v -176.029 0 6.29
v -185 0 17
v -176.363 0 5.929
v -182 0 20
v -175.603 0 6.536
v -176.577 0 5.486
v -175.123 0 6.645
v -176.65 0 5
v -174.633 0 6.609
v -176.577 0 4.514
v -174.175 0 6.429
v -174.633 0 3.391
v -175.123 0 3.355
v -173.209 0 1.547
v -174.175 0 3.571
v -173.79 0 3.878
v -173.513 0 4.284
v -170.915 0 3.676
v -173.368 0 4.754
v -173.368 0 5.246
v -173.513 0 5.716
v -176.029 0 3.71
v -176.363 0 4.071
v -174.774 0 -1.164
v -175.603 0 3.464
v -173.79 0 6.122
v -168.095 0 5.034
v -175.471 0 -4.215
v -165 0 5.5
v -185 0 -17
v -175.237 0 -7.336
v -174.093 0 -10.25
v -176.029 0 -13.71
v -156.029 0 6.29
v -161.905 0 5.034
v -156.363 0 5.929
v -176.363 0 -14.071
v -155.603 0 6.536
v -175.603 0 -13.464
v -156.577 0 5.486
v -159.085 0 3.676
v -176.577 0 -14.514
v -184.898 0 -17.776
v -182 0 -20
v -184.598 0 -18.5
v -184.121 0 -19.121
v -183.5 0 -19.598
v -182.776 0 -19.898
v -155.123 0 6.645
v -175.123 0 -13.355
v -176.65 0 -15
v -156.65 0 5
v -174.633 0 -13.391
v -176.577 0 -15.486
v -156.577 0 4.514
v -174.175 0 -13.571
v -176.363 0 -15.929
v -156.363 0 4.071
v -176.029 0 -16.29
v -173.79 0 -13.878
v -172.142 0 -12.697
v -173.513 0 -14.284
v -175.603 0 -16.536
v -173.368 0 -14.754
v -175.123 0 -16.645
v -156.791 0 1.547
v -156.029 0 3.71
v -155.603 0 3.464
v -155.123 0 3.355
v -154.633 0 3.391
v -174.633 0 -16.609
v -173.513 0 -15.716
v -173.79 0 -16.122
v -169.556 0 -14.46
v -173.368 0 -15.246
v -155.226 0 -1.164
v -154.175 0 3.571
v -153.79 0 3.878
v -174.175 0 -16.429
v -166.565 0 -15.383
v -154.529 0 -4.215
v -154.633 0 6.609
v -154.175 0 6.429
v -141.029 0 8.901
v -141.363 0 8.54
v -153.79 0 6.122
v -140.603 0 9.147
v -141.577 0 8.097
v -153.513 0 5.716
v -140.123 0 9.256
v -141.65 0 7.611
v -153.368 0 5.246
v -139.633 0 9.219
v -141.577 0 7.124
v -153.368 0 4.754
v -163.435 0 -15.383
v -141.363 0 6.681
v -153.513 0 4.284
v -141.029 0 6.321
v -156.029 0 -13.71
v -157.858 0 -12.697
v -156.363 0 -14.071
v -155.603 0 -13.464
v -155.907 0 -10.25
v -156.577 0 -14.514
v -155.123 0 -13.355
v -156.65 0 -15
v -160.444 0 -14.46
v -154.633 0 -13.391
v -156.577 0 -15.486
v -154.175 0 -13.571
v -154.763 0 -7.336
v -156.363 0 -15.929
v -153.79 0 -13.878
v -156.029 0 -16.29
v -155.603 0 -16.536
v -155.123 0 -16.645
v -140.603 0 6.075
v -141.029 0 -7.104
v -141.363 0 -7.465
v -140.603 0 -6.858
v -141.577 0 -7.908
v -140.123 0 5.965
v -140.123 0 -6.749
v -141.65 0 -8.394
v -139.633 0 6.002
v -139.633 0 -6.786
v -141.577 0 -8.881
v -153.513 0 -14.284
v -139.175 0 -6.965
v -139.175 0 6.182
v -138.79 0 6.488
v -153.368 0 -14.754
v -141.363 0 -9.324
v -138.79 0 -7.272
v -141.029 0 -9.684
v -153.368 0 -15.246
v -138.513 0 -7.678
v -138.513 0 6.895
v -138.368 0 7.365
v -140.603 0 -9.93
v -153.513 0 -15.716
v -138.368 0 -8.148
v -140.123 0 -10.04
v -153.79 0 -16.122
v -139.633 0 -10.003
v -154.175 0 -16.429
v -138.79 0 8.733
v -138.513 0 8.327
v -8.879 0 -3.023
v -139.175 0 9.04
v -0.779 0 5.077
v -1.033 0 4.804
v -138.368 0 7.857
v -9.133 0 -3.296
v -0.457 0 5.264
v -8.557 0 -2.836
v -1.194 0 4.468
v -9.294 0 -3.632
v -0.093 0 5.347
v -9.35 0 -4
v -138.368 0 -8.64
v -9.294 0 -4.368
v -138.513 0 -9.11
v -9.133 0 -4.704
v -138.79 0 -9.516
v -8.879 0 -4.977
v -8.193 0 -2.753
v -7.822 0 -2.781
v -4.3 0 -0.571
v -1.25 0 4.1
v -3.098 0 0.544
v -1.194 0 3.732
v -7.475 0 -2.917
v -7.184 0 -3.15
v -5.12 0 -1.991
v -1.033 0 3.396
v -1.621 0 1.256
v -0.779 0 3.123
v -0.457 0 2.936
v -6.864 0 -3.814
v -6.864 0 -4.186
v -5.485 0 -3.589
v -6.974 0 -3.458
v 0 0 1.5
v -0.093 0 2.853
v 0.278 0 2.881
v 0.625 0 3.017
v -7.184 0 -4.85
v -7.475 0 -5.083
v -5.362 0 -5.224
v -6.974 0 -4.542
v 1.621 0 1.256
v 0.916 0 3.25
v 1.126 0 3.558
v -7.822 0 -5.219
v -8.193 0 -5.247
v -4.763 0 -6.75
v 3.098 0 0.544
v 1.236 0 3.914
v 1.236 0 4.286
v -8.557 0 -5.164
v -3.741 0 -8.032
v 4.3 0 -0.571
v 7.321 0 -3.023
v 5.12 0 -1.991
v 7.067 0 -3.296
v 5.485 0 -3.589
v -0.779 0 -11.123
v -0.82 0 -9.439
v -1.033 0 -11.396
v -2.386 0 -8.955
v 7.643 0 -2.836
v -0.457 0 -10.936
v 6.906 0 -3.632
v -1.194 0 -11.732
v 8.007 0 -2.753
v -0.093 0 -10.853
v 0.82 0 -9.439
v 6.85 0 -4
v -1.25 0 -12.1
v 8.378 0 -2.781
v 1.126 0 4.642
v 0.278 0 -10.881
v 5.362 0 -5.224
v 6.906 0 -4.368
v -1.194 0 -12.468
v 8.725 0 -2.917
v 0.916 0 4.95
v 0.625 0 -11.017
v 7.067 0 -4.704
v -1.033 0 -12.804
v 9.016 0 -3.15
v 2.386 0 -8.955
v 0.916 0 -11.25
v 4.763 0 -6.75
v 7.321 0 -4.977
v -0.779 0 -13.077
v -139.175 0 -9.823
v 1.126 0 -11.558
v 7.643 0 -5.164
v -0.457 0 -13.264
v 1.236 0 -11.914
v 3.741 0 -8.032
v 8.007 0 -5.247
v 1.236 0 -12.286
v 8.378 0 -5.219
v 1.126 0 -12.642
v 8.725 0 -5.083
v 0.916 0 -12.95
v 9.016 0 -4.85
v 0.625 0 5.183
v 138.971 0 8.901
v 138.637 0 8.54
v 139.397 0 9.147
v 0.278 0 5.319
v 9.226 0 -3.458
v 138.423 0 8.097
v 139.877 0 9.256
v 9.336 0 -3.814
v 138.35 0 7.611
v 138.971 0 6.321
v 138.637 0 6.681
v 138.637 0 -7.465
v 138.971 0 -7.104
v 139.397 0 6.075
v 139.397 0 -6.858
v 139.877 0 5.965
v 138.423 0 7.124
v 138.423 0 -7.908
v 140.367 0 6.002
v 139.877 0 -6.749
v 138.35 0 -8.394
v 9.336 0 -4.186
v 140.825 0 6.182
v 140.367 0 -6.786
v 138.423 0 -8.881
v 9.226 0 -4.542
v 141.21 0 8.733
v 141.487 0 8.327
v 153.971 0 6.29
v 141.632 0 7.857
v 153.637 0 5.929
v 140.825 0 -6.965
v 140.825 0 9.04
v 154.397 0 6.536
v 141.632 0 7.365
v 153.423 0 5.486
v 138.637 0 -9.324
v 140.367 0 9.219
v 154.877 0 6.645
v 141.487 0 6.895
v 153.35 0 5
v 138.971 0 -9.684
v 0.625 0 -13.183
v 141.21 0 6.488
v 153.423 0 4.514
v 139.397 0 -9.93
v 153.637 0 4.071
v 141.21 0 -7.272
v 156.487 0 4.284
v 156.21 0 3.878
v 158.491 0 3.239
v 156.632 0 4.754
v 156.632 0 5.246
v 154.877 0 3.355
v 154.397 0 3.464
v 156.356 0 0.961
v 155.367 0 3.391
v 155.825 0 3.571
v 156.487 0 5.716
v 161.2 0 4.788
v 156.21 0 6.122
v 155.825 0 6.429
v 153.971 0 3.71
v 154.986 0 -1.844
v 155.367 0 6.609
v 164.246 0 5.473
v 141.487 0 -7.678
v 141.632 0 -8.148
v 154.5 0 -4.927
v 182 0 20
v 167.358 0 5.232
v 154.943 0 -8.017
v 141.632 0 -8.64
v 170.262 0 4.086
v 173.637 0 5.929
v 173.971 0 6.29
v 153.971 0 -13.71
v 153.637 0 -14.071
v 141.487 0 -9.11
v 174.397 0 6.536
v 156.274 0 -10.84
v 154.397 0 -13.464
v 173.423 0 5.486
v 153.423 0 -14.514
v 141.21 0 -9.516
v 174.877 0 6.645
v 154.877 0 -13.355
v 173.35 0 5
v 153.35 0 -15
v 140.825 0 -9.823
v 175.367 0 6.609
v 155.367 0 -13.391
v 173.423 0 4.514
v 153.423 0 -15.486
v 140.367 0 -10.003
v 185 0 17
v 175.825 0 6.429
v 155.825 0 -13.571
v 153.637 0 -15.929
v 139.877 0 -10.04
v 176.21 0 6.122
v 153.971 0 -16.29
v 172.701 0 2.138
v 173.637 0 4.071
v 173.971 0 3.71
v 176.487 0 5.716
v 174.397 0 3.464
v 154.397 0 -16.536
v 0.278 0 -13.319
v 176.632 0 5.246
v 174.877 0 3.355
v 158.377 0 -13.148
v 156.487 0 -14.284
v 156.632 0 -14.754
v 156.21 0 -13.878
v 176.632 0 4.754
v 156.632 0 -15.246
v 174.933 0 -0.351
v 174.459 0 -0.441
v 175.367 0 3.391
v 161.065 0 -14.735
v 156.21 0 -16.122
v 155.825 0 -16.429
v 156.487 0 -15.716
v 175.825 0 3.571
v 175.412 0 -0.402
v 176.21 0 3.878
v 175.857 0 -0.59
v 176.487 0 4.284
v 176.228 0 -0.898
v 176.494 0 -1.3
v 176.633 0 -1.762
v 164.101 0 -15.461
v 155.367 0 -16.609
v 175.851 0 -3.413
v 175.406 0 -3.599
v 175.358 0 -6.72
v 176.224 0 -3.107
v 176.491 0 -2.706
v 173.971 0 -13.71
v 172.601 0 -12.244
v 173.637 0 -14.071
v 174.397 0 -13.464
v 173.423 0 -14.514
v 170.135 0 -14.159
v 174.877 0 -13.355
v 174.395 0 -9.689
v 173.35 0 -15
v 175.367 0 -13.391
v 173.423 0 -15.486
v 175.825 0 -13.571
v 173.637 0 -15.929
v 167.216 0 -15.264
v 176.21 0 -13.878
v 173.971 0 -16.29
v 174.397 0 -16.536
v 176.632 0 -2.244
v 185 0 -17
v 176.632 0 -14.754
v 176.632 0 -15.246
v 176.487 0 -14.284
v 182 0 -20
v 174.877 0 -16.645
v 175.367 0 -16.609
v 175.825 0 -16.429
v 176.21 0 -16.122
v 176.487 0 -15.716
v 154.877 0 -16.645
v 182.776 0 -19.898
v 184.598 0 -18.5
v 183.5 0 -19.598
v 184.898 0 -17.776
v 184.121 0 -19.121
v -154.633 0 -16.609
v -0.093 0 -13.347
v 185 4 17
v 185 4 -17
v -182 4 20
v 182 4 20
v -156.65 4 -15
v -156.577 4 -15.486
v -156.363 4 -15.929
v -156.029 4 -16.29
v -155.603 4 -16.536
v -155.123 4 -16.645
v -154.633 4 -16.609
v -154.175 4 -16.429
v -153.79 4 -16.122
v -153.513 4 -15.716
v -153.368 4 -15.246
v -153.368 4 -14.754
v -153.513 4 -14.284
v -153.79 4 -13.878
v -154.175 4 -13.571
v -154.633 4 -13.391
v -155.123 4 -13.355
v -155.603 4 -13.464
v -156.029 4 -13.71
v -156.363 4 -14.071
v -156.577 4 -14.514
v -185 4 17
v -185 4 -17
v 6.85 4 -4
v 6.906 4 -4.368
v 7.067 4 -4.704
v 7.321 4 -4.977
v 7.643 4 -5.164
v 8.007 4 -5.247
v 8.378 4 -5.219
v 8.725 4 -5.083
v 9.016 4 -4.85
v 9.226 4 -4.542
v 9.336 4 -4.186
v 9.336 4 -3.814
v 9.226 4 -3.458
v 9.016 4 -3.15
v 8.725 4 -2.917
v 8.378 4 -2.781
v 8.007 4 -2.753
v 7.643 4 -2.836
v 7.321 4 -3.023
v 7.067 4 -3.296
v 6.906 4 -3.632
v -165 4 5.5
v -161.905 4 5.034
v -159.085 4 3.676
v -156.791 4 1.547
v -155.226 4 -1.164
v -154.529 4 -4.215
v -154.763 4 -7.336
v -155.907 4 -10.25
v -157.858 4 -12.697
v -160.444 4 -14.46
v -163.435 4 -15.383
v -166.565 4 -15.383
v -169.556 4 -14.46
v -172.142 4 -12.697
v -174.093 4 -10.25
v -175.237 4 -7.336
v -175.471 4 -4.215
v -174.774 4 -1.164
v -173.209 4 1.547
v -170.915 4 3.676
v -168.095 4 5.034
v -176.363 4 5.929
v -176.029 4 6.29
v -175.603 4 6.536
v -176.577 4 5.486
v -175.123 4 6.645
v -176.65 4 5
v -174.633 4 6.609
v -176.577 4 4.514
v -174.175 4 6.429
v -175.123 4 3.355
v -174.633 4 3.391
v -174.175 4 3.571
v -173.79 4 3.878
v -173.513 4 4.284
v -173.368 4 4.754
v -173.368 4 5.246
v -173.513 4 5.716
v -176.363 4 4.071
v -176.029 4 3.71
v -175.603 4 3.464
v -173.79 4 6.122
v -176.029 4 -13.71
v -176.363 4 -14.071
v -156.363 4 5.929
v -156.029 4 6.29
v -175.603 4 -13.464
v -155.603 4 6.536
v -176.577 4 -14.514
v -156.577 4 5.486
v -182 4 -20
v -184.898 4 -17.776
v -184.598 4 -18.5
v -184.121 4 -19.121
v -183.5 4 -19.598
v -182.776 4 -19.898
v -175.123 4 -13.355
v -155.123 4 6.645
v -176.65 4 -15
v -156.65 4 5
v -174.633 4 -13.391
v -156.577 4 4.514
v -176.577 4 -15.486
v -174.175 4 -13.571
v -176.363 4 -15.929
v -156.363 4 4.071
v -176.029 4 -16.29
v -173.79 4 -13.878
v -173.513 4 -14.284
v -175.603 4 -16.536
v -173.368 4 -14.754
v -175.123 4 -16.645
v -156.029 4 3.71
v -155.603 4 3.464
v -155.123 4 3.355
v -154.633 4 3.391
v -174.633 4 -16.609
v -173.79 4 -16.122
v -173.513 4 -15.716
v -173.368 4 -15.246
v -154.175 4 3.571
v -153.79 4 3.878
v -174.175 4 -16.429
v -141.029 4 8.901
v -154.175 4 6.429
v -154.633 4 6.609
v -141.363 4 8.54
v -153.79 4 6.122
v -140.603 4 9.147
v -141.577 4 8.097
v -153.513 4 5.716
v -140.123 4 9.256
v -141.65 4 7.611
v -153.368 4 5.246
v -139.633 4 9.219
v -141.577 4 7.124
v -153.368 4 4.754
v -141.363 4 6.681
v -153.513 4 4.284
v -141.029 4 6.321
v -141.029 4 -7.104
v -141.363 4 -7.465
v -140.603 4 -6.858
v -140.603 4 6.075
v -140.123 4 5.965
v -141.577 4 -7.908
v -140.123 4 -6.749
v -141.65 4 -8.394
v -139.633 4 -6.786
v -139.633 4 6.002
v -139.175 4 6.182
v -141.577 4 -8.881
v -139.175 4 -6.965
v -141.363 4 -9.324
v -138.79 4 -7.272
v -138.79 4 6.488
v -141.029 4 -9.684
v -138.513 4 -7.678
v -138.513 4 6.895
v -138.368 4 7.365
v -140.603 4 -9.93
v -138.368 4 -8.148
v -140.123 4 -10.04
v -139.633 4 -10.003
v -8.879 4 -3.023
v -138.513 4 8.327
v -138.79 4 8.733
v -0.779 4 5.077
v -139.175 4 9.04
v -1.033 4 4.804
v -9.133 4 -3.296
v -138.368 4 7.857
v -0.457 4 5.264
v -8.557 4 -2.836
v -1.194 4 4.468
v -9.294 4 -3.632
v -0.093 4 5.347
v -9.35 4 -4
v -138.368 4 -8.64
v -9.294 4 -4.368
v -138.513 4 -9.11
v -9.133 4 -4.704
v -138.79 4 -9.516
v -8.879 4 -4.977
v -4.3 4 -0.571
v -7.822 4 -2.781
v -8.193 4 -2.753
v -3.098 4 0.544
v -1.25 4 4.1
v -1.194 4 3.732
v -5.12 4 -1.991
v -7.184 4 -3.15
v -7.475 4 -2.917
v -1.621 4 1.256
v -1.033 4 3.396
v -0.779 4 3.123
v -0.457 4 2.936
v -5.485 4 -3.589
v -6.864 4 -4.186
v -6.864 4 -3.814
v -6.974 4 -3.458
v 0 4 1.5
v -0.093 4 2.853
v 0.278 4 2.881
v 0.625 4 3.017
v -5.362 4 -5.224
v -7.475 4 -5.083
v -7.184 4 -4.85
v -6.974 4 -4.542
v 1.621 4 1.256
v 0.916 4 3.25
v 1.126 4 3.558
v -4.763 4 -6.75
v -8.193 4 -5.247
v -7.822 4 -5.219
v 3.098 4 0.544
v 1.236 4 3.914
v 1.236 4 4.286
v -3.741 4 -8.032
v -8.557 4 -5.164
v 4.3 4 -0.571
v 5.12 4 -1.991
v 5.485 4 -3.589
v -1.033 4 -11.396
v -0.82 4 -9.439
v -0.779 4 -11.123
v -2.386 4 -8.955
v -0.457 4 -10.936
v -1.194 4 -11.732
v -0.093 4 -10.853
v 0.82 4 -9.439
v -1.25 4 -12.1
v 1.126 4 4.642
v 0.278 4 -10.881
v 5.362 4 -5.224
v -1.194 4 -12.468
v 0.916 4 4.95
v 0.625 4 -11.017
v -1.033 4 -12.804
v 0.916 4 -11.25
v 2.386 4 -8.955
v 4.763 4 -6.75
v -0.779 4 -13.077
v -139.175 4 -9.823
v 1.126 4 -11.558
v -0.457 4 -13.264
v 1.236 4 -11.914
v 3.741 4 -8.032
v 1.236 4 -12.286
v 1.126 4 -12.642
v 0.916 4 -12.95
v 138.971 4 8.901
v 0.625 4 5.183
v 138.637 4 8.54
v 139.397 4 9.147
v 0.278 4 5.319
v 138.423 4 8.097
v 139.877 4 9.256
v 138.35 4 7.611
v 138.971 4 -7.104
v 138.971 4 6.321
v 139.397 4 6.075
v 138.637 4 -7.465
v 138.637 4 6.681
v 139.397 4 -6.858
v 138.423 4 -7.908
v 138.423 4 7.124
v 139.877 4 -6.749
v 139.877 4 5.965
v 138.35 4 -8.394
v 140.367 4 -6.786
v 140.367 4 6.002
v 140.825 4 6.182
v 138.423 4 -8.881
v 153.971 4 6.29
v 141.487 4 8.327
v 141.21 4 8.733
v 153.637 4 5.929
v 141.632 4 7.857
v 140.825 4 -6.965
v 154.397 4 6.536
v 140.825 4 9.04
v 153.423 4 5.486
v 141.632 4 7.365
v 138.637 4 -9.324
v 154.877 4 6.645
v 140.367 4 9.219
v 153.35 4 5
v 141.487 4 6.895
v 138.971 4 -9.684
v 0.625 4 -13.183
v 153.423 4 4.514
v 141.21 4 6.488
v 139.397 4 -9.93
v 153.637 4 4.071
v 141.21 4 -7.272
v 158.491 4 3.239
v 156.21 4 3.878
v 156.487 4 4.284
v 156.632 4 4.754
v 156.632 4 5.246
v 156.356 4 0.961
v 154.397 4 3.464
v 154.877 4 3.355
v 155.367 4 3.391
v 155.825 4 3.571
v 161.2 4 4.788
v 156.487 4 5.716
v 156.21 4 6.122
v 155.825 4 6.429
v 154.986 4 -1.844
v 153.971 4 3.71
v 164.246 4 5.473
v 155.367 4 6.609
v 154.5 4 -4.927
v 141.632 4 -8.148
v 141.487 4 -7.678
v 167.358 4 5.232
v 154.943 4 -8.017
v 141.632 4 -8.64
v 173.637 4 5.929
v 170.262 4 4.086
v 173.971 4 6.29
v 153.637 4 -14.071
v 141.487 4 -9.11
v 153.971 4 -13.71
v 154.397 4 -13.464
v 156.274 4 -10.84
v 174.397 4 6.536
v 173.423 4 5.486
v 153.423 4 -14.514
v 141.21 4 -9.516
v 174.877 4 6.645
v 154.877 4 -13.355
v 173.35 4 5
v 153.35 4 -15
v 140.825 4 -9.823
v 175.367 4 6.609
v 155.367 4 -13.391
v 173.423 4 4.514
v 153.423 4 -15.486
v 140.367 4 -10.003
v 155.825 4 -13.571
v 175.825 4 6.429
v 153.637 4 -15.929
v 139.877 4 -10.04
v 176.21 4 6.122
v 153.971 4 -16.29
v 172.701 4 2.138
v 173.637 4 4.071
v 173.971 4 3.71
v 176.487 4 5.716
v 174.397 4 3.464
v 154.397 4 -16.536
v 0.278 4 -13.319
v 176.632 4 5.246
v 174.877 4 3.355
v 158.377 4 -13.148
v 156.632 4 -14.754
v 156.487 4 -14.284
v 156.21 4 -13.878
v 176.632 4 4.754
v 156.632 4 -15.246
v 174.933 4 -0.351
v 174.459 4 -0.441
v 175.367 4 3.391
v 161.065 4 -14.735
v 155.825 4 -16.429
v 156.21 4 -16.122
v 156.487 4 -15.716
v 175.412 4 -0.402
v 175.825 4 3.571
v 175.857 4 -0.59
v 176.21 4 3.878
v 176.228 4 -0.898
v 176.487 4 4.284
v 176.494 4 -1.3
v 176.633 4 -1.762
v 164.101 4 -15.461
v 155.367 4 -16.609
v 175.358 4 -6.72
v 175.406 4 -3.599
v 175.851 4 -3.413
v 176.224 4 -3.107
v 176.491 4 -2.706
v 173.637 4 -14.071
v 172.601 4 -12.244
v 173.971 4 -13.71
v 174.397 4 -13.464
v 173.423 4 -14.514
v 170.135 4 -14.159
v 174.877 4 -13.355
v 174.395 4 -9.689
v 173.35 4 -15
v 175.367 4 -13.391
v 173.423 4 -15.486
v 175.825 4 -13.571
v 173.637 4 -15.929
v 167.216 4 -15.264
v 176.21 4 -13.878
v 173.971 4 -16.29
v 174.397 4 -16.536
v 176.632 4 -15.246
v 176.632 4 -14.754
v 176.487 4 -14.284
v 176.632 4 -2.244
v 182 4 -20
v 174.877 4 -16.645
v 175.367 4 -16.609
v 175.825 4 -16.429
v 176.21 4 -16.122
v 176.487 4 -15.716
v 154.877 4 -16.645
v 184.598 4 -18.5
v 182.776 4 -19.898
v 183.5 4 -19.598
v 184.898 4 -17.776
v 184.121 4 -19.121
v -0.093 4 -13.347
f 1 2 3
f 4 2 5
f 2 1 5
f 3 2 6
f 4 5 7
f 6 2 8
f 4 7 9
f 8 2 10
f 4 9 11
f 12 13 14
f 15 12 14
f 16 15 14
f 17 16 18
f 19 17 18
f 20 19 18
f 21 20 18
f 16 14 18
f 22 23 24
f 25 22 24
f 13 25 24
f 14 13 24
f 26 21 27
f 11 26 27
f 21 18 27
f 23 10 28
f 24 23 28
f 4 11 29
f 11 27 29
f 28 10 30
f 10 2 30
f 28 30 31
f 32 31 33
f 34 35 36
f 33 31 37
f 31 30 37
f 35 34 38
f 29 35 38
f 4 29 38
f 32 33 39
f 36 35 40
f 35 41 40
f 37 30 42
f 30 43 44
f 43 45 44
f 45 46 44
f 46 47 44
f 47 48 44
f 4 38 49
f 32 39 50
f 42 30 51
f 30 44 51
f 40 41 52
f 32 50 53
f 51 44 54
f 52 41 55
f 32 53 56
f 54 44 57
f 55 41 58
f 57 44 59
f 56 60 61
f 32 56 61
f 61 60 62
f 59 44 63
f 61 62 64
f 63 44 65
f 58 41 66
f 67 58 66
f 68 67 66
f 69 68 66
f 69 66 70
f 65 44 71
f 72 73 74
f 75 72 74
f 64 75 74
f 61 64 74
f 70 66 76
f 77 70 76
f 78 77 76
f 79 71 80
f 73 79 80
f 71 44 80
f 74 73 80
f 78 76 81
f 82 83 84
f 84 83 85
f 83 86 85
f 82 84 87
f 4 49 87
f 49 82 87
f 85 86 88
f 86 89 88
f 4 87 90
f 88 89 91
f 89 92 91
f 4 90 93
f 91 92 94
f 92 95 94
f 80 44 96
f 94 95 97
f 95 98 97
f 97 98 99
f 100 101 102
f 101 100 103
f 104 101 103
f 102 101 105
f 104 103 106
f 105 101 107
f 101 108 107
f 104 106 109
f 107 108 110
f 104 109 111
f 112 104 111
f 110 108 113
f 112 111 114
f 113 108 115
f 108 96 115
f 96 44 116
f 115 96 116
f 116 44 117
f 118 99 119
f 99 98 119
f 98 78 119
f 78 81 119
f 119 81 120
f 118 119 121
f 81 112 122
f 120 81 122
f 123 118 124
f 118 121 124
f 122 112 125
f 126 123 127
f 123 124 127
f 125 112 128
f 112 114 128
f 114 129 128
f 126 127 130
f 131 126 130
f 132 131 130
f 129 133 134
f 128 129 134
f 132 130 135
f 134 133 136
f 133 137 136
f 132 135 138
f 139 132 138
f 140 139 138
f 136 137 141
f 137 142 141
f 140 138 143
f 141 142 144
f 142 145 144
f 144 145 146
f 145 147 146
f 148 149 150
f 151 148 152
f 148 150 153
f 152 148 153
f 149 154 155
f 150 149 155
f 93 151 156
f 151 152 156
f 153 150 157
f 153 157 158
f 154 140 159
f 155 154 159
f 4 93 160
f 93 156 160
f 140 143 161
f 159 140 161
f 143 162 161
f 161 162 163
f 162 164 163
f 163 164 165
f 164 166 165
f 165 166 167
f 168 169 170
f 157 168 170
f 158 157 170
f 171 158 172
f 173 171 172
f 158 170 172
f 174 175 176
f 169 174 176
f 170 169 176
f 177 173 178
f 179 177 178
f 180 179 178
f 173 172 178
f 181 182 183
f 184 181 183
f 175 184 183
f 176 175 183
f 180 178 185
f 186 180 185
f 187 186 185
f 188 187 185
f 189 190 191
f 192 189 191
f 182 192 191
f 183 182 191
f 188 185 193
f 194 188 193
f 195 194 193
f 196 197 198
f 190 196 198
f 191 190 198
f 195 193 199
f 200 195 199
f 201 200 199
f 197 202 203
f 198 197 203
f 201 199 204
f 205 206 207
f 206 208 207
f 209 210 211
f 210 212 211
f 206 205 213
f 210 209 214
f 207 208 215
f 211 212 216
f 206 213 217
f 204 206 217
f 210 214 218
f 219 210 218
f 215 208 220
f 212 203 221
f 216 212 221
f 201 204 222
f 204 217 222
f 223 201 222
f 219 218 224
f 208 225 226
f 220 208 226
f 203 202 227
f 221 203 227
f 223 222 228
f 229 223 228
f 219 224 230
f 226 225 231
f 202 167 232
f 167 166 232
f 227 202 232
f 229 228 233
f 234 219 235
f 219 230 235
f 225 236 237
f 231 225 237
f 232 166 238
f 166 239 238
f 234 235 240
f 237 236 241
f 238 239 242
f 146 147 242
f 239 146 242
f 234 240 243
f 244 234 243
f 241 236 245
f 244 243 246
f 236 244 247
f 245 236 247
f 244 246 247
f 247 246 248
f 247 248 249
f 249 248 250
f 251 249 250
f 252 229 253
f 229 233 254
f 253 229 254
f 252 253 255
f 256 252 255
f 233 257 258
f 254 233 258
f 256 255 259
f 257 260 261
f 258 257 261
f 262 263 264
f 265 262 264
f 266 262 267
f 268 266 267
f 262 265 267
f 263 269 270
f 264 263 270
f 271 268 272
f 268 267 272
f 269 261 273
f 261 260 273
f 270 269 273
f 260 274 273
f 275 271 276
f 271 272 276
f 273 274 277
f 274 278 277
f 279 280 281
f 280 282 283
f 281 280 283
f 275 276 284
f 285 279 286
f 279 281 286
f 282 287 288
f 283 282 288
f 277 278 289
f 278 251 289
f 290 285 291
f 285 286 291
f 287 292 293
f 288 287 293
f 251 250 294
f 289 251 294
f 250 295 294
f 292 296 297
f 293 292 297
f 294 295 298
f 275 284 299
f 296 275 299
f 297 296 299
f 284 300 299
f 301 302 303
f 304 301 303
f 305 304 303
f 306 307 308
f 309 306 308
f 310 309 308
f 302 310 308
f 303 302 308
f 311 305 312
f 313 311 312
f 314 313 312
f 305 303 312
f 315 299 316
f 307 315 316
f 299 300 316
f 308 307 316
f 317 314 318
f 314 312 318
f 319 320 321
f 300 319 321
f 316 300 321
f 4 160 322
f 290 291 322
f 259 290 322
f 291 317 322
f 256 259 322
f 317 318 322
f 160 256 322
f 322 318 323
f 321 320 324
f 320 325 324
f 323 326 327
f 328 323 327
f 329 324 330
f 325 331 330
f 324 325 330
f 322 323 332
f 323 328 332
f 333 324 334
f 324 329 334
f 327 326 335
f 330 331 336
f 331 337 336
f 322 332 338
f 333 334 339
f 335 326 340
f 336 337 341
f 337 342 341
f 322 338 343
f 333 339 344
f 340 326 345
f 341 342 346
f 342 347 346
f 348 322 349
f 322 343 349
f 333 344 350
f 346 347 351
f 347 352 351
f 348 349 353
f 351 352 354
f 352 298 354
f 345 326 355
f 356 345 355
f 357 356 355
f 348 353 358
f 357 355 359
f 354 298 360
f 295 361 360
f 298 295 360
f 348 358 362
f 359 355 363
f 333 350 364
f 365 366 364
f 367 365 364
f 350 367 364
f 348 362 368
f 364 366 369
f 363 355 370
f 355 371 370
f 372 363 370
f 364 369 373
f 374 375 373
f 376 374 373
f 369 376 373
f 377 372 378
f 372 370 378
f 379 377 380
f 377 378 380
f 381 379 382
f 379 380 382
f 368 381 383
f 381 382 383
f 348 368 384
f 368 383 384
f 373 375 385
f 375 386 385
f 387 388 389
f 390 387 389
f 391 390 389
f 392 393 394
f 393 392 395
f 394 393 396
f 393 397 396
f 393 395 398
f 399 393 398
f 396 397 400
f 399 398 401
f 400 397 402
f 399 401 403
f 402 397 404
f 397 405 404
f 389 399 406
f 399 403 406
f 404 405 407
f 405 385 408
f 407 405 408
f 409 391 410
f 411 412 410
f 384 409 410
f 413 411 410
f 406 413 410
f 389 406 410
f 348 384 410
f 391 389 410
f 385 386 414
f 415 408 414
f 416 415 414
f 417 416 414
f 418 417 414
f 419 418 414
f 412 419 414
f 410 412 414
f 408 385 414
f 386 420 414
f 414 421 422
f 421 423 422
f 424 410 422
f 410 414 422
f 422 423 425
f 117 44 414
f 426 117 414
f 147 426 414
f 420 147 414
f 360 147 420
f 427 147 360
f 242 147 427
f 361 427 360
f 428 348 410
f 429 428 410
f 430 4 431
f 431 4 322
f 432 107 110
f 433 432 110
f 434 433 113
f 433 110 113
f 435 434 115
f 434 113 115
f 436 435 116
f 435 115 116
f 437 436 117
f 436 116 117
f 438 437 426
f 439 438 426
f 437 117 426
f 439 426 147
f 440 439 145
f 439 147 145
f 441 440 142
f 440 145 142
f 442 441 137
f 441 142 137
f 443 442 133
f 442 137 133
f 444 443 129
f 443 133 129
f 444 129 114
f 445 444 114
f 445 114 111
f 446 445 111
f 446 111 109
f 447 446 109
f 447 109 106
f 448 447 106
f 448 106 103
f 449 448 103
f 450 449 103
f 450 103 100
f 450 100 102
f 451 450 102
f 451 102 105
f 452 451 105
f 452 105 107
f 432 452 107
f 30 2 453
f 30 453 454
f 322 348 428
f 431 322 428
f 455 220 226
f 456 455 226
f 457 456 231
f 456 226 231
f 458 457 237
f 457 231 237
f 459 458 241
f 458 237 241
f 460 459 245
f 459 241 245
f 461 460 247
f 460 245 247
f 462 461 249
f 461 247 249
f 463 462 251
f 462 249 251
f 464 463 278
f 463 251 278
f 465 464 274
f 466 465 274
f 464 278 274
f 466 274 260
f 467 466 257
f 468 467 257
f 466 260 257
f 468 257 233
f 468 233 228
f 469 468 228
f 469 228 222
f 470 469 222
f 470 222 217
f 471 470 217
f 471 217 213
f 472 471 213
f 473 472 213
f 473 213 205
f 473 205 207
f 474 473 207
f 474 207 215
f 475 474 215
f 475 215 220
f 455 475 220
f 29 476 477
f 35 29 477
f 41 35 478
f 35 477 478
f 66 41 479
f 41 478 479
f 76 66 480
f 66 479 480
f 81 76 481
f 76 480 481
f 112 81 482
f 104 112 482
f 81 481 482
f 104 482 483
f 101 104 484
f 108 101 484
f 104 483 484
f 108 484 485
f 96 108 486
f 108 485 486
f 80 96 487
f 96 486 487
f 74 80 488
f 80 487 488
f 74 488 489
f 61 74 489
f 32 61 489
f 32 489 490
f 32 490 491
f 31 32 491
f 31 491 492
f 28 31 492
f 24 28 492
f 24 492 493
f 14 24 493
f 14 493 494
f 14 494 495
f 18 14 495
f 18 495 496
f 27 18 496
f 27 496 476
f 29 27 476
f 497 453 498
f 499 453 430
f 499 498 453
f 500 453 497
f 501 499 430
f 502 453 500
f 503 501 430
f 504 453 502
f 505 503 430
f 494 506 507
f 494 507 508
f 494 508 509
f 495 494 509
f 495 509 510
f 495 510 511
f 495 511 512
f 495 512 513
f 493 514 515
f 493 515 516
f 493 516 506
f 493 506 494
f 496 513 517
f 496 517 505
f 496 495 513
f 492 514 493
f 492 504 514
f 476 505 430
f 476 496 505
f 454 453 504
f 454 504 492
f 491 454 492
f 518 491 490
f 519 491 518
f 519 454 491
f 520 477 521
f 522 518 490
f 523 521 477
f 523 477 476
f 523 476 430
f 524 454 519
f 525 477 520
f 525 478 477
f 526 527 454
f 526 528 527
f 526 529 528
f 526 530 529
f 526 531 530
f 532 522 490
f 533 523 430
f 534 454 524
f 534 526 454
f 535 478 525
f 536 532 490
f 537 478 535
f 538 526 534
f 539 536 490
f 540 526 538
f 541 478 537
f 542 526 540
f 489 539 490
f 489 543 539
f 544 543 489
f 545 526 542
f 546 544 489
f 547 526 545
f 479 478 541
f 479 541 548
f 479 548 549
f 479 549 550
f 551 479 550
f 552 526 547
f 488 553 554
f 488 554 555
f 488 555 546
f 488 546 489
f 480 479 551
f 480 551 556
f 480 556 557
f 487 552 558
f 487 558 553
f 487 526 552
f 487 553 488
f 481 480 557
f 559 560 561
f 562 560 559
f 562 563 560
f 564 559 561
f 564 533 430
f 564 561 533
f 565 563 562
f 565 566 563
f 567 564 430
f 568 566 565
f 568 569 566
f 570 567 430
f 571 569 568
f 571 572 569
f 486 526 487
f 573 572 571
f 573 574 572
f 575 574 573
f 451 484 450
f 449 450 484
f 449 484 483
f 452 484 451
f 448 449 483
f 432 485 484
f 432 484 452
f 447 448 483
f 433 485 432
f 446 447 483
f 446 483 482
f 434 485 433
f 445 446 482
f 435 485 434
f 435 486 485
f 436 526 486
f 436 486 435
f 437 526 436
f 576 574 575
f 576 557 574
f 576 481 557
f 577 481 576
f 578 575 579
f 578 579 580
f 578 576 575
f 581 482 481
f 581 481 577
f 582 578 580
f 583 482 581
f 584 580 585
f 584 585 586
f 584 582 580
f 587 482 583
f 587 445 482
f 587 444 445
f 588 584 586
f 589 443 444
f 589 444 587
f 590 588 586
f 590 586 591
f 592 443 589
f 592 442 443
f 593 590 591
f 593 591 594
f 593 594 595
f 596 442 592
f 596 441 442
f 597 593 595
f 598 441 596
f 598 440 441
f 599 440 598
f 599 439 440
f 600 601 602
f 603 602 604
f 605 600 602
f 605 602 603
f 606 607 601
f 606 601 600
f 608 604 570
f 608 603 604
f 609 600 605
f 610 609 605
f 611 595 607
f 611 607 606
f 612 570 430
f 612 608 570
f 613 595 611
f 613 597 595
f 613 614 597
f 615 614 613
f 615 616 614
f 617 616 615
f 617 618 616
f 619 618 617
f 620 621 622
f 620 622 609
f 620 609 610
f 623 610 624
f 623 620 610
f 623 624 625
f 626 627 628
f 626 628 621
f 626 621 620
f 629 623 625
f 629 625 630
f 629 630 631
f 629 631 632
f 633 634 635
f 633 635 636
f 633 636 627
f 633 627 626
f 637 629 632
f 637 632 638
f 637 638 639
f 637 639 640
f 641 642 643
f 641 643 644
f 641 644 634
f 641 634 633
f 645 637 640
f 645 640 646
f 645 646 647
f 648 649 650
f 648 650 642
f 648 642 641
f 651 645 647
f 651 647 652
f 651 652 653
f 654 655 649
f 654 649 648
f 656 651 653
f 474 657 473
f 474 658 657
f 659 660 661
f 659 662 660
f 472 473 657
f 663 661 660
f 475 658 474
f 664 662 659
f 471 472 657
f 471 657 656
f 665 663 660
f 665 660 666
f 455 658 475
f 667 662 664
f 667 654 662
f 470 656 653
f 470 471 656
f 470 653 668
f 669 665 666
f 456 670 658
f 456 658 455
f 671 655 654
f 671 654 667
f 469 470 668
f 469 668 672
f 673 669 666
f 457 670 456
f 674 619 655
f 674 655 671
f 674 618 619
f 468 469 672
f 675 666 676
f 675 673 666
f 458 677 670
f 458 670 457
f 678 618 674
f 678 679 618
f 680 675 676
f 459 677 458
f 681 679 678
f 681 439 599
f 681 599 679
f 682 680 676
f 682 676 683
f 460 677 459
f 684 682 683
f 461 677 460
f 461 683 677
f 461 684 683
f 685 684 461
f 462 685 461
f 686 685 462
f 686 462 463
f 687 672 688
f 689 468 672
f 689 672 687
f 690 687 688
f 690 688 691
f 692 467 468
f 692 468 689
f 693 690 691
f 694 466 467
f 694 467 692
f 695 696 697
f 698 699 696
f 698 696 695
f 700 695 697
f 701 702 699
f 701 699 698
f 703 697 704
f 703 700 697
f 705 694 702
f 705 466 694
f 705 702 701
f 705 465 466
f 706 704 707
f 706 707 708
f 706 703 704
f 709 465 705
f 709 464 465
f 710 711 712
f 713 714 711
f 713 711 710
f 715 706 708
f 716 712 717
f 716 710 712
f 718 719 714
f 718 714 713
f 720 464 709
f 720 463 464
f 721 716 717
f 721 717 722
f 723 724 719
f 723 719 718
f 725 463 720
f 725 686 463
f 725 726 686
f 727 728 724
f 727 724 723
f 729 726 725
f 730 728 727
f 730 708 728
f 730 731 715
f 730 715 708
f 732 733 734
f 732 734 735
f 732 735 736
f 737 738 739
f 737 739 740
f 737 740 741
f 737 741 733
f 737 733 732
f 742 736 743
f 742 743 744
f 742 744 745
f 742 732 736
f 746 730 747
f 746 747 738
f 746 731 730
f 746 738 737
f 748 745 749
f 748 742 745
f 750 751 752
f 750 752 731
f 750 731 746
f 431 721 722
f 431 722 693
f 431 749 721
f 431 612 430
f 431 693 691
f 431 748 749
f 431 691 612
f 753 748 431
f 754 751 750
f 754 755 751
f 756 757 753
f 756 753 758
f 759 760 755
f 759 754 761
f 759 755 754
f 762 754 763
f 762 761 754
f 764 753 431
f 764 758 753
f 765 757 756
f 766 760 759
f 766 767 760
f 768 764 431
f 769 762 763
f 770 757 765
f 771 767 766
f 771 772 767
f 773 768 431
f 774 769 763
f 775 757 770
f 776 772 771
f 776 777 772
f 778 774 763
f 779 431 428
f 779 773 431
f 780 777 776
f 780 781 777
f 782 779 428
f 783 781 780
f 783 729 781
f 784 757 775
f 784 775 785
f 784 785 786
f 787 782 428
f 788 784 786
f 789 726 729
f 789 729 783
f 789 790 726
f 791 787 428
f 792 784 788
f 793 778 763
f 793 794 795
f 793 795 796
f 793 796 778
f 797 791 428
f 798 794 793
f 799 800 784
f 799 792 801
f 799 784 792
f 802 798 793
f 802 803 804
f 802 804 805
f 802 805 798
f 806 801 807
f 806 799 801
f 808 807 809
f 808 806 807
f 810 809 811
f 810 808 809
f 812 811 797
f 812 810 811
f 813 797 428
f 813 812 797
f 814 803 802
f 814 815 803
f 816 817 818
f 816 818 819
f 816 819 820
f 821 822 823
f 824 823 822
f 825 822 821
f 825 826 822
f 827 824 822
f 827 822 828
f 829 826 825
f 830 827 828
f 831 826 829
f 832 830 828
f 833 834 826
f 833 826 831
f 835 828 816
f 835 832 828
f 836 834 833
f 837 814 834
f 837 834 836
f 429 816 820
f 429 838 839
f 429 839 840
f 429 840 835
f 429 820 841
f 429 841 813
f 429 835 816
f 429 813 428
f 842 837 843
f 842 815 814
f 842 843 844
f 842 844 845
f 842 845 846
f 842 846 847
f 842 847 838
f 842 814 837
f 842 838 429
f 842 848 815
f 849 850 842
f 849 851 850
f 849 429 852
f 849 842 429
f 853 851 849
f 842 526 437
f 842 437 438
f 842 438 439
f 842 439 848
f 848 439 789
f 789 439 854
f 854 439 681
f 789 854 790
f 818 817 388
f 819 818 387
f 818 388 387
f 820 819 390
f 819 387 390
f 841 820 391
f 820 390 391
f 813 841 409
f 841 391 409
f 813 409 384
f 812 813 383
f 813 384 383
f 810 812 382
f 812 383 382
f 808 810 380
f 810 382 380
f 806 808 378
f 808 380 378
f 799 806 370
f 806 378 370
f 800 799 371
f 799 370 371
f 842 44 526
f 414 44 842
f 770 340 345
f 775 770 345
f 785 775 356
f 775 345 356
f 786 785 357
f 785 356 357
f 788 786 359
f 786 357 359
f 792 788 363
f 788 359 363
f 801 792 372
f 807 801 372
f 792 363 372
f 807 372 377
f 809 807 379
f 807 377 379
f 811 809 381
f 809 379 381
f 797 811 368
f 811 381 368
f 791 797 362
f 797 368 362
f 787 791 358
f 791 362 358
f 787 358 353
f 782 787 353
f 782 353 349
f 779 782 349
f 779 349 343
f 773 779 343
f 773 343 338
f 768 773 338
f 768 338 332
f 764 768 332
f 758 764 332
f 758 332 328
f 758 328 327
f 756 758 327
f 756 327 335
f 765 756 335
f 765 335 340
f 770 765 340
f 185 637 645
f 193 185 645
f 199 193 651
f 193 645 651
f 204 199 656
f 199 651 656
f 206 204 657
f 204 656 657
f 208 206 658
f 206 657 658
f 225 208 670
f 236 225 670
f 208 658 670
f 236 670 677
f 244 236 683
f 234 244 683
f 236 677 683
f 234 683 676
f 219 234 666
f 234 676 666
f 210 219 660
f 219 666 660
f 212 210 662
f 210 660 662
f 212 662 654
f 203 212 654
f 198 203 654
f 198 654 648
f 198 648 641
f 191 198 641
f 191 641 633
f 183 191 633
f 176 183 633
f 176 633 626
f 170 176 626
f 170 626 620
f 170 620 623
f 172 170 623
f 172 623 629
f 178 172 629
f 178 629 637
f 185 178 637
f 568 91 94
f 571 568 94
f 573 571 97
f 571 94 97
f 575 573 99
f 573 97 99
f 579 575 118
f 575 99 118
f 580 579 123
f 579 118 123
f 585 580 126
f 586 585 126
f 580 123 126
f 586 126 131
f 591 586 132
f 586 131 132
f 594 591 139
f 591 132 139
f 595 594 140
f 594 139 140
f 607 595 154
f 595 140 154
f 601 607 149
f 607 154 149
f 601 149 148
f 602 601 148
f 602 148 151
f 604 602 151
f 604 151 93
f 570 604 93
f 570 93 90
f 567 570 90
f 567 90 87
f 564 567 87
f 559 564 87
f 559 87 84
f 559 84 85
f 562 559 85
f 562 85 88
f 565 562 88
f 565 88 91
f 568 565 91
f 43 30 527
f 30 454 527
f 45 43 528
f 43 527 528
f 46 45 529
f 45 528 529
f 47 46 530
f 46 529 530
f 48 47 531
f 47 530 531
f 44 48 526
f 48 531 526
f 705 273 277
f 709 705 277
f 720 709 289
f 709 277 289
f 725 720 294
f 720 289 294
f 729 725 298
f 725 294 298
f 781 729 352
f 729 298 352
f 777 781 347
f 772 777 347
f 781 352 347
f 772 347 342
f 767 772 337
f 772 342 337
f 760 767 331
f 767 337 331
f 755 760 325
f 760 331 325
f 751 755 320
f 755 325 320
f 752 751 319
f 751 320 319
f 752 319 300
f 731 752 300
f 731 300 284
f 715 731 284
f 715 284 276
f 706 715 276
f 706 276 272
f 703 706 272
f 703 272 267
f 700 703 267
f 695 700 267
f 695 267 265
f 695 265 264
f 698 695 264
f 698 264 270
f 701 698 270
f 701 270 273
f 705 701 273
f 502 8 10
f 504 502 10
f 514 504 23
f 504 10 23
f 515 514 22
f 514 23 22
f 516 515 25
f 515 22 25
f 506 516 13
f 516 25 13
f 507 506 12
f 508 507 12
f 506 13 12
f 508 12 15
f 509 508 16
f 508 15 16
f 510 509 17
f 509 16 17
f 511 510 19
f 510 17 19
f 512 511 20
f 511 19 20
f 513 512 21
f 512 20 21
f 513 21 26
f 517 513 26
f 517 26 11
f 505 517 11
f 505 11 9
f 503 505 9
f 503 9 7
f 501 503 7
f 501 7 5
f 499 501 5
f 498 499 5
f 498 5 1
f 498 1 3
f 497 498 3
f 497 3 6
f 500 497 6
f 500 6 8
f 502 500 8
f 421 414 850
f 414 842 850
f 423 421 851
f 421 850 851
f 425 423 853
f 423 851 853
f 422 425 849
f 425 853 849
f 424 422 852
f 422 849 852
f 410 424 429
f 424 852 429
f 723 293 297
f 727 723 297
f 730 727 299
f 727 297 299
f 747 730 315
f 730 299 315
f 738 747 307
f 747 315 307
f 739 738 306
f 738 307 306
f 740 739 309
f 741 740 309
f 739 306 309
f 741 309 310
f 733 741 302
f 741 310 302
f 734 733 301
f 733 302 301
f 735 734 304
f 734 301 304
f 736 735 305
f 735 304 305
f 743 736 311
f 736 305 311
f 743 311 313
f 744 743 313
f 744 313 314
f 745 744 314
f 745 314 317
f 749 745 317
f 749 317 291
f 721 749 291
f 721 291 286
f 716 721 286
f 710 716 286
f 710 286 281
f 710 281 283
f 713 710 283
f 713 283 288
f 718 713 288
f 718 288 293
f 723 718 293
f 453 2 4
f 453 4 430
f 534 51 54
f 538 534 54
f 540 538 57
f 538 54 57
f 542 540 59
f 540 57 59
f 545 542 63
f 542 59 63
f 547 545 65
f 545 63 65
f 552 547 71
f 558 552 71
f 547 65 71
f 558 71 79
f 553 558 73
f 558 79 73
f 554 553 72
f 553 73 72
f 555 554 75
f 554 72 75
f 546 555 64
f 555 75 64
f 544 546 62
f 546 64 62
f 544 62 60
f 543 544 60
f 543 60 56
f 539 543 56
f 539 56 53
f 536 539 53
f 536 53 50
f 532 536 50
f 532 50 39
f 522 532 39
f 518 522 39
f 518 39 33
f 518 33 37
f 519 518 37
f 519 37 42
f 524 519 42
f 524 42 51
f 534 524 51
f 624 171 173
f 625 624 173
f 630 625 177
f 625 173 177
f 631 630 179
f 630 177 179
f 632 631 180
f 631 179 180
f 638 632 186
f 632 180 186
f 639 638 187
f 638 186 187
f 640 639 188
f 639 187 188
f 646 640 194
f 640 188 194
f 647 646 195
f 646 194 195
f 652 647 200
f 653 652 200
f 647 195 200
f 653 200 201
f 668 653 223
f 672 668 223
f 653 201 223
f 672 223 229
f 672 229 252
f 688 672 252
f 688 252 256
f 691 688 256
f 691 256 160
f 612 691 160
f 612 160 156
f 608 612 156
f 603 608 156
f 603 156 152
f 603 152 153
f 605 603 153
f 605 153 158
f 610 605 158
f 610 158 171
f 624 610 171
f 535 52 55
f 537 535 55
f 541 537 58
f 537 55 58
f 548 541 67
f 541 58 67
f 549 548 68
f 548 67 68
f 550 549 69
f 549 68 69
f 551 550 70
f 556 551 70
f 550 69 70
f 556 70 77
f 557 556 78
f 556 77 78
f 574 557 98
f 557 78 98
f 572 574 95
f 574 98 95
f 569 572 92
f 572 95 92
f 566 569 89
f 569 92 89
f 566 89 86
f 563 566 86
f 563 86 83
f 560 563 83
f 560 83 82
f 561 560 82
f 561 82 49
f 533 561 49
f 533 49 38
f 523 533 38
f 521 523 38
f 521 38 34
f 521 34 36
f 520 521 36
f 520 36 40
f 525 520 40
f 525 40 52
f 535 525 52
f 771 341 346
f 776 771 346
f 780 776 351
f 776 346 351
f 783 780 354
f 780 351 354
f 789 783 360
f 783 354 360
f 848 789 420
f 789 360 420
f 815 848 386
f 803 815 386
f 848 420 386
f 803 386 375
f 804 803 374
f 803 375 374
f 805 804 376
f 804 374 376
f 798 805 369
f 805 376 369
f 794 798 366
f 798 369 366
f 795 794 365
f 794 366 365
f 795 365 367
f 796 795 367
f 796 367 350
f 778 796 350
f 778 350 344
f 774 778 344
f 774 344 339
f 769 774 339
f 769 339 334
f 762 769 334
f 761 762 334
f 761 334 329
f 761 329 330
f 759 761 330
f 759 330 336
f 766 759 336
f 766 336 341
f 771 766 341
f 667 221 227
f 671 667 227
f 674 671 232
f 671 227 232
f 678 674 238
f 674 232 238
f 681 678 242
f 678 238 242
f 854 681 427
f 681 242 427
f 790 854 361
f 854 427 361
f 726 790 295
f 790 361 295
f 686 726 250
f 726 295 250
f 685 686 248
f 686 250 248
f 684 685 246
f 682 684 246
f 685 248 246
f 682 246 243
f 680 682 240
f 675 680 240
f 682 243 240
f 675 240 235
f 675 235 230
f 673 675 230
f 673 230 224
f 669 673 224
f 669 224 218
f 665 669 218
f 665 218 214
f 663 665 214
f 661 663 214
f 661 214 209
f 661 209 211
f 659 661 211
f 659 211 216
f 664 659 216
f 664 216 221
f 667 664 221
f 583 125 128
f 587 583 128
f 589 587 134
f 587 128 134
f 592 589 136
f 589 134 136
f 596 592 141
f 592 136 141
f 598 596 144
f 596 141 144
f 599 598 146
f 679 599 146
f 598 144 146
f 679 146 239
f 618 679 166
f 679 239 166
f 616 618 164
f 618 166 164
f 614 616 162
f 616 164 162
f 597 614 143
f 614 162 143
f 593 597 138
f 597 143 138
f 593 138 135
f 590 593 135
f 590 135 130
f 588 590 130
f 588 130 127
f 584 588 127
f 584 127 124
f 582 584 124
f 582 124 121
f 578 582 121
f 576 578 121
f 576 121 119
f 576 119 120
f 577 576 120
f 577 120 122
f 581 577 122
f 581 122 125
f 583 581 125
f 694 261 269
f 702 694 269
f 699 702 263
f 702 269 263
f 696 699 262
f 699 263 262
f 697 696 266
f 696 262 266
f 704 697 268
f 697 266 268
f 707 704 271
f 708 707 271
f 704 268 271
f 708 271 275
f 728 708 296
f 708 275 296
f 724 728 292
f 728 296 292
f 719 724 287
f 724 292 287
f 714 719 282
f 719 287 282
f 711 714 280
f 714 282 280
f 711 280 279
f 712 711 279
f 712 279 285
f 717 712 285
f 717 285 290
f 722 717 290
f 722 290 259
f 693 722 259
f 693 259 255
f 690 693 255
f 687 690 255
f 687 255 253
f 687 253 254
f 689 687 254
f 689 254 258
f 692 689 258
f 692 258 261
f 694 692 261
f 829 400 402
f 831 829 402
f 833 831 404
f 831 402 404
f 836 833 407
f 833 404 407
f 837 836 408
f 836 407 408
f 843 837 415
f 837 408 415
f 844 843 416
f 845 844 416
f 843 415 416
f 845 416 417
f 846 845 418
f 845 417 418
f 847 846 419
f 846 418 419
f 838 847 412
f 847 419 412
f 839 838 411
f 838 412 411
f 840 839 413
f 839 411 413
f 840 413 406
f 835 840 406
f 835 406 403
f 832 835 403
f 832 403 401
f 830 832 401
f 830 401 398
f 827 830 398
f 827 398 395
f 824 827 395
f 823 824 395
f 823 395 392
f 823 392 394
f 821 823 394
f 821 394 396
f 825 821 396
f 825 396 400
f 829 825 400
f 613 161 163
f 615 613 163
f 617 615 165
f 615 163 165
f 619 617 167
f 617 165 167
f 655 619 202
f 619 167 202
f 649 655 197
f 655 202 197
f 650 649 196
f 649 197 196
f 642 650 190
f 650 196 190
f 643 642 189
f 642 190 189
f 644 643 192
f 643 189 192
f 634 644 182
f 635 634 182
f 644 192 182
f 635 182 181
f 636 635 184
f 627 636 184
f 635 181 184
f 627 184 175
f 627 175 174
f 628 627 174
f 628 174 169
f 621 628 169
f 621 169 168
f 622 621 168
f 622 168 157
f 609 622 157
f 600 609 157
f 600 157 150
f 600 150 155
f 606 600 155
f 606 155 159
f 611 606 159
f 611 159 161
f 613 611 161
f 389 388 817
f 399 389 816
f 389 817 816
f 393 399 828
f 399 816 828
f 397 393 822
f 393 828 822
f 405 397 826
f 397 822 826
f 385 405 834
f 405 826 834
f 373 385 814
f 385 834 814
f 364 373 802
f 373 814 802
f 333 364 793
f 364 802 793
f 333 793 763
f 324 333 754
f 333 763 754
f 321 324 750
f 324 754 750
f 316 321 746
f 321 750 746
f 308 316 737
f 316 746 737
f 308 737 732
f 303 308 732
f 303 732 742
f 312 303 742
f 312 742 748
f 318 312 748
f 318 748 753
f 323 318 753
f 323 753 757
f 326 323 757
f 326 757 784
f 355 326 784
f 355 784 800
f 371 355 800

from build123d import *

# Parameters (mm, degrees)
SKETCH1_W                 = 370
SKETCH1_H                 = 40
BOSS_EXTRUDE1_DEPTH       = 4
CUT_EXTRUDE1_REACH        = 188.121
SKETCH2_R                 = 10.5
SKETCH2_R_2               = 5.5
M4X0_7_TAPPED_HOLE1_D     = 3.3
M4X0_7_TAPPED_HOLE1_DEPTH = 4
CHAMFER1_SIZE             = 3
FILLET1_R                 = 3
M3X0_5_TAPPED_HOLE1_D     = 2.5


with BuildPart() as part:
    # Sketch1 → Boss-Extrude1 (new body)
    with BuildSketch(Plane(origin=(0, 0, 0), x_dir=(1, 0, 0), z_dir=(0, 1, 0))):
        Rectangle(SKETCH1_W, SKETCH1_H)
    extrude(amount=BOSS_EXTRUDE1_DEPTH)

    # Sketch2 → Cut-Extrude1 (cut, up to next)
    with BuildSketch(Plane(origin=(0, 4, 0), x_dir=(1, 0, 0), z_dir=(0, 1, 0)), mode=Mode.PRIVATE) as cut_extrude1_sk1:
        with Locations(Location((165, 5, 0), (0, 0, 270))):
            Circle(SKETCH2_R)
    cut_extrude1_tool1 = extrude(cut_extrude1_sk1.sketch, amount=-CUT_EXTRUDE1_REACH, mode=Mode.PRIVATE) & part.part
    # Sketch2 → Cut-Extrude1 (cut, up to next)
    with BuildSketch(Plane(origin=(0, 4, 0), x_dir=(1, 0, 0), z_dir=(0, 1, 0)), mode=Mode.PRIVATE) as cut_extrude1_sk2:
        with Locations(Location((-165, 5, 0), (0, 0, 270))):
            Circle(SKETCH2_R)
    cut_extrude1_tool2 = extrude(cut_extrude1_sk2.sketch, amount=-CUT_EXTRUDE1_REACH, mode=Mode.PRIVATE) & part.part
    # Sketch2 → Cut-Extrude1 (cut, up to next)
    with BuildSketch(Plane(origin=(0, 4, 0), x_dir=(1, 0, 0), z_dir=(0, 1, 0)), mode=Mode.PRIVATE) as cut_extrude1_sk3:
        with Locations(Location((0, 4, 0), (0, 0, 270))):
            Circle(SKETCH2_R_2)
    cut_extrude1_tool3 = extrude(cut_extrude1_sk3.sketch, amount=-CUT_EXTRUDE1_REACH, mode=Mode.PRIVATE) & part.part
    add(cut_extrude1_tool1.solids().sort_by_distance((165, 4, -5))[0], mode=Mode.SUBTRACT)
    add(cut_extrude1_tool2.solids().sort_by_distance((-165, 4, -5))[0], mode=Mode.SUBTRACT)
    add(cut_extrude1_tool3.solids().sort_by_distance((0, 4, -4))[0], mode=Mode.SUBTRACT)

    # M4x0.7 Tapped Hole1
    with Locations(Plane(origin=(0, 4, 0), x_dir=(1, 0, 0), z_dir=(0, 1, 0))):
        with Locations((175, 2), (155, 15), (175, 15), (155, -5), (175, -5), (-175, 15), (-155, 15), (-175, -5), (-155, -5), (-140, 8.394191797), (-140, -7.610688145), (140, 8.394191797), (140, -7.610688145)):
            Hole(M4X0_7_TAPPED_HOLE1_D / 2, depth=M4X0_7_TAPPED_HOLE1_DEPTH)

    # Chamfer1
    chamfer1_edges = [part.edges().sort_by_distance(p)[0] for p in [
        (185, 2, 20),
        (-185, 2, 20),
    ]]
    chamfer(chamfer1_edges, length=CHAMFER1_SIZE)

    # Fillet1
    fillet1_edges = [part.edges().sort_by_distance(p)[0] for p in [
        (-185, 2, -20),
        (185, 2, -20),
    ]]
    fillet(fillet1_edges, radius=FILLET1_R)

    # M3x0.5 Tapped Hole1 (through all)
    with Locations(Plane(origin=(0, 4, 0), x_dir=(1, 0, 0), z_dir=(0, 1, 0))):
        with Locations((0, 12.1), (8.1, 4), (0, -4.1), (-8.1, 4)):
            Hole(M3X0_5_TAPPED_HOLE1_D / 2)


solid = part.part
